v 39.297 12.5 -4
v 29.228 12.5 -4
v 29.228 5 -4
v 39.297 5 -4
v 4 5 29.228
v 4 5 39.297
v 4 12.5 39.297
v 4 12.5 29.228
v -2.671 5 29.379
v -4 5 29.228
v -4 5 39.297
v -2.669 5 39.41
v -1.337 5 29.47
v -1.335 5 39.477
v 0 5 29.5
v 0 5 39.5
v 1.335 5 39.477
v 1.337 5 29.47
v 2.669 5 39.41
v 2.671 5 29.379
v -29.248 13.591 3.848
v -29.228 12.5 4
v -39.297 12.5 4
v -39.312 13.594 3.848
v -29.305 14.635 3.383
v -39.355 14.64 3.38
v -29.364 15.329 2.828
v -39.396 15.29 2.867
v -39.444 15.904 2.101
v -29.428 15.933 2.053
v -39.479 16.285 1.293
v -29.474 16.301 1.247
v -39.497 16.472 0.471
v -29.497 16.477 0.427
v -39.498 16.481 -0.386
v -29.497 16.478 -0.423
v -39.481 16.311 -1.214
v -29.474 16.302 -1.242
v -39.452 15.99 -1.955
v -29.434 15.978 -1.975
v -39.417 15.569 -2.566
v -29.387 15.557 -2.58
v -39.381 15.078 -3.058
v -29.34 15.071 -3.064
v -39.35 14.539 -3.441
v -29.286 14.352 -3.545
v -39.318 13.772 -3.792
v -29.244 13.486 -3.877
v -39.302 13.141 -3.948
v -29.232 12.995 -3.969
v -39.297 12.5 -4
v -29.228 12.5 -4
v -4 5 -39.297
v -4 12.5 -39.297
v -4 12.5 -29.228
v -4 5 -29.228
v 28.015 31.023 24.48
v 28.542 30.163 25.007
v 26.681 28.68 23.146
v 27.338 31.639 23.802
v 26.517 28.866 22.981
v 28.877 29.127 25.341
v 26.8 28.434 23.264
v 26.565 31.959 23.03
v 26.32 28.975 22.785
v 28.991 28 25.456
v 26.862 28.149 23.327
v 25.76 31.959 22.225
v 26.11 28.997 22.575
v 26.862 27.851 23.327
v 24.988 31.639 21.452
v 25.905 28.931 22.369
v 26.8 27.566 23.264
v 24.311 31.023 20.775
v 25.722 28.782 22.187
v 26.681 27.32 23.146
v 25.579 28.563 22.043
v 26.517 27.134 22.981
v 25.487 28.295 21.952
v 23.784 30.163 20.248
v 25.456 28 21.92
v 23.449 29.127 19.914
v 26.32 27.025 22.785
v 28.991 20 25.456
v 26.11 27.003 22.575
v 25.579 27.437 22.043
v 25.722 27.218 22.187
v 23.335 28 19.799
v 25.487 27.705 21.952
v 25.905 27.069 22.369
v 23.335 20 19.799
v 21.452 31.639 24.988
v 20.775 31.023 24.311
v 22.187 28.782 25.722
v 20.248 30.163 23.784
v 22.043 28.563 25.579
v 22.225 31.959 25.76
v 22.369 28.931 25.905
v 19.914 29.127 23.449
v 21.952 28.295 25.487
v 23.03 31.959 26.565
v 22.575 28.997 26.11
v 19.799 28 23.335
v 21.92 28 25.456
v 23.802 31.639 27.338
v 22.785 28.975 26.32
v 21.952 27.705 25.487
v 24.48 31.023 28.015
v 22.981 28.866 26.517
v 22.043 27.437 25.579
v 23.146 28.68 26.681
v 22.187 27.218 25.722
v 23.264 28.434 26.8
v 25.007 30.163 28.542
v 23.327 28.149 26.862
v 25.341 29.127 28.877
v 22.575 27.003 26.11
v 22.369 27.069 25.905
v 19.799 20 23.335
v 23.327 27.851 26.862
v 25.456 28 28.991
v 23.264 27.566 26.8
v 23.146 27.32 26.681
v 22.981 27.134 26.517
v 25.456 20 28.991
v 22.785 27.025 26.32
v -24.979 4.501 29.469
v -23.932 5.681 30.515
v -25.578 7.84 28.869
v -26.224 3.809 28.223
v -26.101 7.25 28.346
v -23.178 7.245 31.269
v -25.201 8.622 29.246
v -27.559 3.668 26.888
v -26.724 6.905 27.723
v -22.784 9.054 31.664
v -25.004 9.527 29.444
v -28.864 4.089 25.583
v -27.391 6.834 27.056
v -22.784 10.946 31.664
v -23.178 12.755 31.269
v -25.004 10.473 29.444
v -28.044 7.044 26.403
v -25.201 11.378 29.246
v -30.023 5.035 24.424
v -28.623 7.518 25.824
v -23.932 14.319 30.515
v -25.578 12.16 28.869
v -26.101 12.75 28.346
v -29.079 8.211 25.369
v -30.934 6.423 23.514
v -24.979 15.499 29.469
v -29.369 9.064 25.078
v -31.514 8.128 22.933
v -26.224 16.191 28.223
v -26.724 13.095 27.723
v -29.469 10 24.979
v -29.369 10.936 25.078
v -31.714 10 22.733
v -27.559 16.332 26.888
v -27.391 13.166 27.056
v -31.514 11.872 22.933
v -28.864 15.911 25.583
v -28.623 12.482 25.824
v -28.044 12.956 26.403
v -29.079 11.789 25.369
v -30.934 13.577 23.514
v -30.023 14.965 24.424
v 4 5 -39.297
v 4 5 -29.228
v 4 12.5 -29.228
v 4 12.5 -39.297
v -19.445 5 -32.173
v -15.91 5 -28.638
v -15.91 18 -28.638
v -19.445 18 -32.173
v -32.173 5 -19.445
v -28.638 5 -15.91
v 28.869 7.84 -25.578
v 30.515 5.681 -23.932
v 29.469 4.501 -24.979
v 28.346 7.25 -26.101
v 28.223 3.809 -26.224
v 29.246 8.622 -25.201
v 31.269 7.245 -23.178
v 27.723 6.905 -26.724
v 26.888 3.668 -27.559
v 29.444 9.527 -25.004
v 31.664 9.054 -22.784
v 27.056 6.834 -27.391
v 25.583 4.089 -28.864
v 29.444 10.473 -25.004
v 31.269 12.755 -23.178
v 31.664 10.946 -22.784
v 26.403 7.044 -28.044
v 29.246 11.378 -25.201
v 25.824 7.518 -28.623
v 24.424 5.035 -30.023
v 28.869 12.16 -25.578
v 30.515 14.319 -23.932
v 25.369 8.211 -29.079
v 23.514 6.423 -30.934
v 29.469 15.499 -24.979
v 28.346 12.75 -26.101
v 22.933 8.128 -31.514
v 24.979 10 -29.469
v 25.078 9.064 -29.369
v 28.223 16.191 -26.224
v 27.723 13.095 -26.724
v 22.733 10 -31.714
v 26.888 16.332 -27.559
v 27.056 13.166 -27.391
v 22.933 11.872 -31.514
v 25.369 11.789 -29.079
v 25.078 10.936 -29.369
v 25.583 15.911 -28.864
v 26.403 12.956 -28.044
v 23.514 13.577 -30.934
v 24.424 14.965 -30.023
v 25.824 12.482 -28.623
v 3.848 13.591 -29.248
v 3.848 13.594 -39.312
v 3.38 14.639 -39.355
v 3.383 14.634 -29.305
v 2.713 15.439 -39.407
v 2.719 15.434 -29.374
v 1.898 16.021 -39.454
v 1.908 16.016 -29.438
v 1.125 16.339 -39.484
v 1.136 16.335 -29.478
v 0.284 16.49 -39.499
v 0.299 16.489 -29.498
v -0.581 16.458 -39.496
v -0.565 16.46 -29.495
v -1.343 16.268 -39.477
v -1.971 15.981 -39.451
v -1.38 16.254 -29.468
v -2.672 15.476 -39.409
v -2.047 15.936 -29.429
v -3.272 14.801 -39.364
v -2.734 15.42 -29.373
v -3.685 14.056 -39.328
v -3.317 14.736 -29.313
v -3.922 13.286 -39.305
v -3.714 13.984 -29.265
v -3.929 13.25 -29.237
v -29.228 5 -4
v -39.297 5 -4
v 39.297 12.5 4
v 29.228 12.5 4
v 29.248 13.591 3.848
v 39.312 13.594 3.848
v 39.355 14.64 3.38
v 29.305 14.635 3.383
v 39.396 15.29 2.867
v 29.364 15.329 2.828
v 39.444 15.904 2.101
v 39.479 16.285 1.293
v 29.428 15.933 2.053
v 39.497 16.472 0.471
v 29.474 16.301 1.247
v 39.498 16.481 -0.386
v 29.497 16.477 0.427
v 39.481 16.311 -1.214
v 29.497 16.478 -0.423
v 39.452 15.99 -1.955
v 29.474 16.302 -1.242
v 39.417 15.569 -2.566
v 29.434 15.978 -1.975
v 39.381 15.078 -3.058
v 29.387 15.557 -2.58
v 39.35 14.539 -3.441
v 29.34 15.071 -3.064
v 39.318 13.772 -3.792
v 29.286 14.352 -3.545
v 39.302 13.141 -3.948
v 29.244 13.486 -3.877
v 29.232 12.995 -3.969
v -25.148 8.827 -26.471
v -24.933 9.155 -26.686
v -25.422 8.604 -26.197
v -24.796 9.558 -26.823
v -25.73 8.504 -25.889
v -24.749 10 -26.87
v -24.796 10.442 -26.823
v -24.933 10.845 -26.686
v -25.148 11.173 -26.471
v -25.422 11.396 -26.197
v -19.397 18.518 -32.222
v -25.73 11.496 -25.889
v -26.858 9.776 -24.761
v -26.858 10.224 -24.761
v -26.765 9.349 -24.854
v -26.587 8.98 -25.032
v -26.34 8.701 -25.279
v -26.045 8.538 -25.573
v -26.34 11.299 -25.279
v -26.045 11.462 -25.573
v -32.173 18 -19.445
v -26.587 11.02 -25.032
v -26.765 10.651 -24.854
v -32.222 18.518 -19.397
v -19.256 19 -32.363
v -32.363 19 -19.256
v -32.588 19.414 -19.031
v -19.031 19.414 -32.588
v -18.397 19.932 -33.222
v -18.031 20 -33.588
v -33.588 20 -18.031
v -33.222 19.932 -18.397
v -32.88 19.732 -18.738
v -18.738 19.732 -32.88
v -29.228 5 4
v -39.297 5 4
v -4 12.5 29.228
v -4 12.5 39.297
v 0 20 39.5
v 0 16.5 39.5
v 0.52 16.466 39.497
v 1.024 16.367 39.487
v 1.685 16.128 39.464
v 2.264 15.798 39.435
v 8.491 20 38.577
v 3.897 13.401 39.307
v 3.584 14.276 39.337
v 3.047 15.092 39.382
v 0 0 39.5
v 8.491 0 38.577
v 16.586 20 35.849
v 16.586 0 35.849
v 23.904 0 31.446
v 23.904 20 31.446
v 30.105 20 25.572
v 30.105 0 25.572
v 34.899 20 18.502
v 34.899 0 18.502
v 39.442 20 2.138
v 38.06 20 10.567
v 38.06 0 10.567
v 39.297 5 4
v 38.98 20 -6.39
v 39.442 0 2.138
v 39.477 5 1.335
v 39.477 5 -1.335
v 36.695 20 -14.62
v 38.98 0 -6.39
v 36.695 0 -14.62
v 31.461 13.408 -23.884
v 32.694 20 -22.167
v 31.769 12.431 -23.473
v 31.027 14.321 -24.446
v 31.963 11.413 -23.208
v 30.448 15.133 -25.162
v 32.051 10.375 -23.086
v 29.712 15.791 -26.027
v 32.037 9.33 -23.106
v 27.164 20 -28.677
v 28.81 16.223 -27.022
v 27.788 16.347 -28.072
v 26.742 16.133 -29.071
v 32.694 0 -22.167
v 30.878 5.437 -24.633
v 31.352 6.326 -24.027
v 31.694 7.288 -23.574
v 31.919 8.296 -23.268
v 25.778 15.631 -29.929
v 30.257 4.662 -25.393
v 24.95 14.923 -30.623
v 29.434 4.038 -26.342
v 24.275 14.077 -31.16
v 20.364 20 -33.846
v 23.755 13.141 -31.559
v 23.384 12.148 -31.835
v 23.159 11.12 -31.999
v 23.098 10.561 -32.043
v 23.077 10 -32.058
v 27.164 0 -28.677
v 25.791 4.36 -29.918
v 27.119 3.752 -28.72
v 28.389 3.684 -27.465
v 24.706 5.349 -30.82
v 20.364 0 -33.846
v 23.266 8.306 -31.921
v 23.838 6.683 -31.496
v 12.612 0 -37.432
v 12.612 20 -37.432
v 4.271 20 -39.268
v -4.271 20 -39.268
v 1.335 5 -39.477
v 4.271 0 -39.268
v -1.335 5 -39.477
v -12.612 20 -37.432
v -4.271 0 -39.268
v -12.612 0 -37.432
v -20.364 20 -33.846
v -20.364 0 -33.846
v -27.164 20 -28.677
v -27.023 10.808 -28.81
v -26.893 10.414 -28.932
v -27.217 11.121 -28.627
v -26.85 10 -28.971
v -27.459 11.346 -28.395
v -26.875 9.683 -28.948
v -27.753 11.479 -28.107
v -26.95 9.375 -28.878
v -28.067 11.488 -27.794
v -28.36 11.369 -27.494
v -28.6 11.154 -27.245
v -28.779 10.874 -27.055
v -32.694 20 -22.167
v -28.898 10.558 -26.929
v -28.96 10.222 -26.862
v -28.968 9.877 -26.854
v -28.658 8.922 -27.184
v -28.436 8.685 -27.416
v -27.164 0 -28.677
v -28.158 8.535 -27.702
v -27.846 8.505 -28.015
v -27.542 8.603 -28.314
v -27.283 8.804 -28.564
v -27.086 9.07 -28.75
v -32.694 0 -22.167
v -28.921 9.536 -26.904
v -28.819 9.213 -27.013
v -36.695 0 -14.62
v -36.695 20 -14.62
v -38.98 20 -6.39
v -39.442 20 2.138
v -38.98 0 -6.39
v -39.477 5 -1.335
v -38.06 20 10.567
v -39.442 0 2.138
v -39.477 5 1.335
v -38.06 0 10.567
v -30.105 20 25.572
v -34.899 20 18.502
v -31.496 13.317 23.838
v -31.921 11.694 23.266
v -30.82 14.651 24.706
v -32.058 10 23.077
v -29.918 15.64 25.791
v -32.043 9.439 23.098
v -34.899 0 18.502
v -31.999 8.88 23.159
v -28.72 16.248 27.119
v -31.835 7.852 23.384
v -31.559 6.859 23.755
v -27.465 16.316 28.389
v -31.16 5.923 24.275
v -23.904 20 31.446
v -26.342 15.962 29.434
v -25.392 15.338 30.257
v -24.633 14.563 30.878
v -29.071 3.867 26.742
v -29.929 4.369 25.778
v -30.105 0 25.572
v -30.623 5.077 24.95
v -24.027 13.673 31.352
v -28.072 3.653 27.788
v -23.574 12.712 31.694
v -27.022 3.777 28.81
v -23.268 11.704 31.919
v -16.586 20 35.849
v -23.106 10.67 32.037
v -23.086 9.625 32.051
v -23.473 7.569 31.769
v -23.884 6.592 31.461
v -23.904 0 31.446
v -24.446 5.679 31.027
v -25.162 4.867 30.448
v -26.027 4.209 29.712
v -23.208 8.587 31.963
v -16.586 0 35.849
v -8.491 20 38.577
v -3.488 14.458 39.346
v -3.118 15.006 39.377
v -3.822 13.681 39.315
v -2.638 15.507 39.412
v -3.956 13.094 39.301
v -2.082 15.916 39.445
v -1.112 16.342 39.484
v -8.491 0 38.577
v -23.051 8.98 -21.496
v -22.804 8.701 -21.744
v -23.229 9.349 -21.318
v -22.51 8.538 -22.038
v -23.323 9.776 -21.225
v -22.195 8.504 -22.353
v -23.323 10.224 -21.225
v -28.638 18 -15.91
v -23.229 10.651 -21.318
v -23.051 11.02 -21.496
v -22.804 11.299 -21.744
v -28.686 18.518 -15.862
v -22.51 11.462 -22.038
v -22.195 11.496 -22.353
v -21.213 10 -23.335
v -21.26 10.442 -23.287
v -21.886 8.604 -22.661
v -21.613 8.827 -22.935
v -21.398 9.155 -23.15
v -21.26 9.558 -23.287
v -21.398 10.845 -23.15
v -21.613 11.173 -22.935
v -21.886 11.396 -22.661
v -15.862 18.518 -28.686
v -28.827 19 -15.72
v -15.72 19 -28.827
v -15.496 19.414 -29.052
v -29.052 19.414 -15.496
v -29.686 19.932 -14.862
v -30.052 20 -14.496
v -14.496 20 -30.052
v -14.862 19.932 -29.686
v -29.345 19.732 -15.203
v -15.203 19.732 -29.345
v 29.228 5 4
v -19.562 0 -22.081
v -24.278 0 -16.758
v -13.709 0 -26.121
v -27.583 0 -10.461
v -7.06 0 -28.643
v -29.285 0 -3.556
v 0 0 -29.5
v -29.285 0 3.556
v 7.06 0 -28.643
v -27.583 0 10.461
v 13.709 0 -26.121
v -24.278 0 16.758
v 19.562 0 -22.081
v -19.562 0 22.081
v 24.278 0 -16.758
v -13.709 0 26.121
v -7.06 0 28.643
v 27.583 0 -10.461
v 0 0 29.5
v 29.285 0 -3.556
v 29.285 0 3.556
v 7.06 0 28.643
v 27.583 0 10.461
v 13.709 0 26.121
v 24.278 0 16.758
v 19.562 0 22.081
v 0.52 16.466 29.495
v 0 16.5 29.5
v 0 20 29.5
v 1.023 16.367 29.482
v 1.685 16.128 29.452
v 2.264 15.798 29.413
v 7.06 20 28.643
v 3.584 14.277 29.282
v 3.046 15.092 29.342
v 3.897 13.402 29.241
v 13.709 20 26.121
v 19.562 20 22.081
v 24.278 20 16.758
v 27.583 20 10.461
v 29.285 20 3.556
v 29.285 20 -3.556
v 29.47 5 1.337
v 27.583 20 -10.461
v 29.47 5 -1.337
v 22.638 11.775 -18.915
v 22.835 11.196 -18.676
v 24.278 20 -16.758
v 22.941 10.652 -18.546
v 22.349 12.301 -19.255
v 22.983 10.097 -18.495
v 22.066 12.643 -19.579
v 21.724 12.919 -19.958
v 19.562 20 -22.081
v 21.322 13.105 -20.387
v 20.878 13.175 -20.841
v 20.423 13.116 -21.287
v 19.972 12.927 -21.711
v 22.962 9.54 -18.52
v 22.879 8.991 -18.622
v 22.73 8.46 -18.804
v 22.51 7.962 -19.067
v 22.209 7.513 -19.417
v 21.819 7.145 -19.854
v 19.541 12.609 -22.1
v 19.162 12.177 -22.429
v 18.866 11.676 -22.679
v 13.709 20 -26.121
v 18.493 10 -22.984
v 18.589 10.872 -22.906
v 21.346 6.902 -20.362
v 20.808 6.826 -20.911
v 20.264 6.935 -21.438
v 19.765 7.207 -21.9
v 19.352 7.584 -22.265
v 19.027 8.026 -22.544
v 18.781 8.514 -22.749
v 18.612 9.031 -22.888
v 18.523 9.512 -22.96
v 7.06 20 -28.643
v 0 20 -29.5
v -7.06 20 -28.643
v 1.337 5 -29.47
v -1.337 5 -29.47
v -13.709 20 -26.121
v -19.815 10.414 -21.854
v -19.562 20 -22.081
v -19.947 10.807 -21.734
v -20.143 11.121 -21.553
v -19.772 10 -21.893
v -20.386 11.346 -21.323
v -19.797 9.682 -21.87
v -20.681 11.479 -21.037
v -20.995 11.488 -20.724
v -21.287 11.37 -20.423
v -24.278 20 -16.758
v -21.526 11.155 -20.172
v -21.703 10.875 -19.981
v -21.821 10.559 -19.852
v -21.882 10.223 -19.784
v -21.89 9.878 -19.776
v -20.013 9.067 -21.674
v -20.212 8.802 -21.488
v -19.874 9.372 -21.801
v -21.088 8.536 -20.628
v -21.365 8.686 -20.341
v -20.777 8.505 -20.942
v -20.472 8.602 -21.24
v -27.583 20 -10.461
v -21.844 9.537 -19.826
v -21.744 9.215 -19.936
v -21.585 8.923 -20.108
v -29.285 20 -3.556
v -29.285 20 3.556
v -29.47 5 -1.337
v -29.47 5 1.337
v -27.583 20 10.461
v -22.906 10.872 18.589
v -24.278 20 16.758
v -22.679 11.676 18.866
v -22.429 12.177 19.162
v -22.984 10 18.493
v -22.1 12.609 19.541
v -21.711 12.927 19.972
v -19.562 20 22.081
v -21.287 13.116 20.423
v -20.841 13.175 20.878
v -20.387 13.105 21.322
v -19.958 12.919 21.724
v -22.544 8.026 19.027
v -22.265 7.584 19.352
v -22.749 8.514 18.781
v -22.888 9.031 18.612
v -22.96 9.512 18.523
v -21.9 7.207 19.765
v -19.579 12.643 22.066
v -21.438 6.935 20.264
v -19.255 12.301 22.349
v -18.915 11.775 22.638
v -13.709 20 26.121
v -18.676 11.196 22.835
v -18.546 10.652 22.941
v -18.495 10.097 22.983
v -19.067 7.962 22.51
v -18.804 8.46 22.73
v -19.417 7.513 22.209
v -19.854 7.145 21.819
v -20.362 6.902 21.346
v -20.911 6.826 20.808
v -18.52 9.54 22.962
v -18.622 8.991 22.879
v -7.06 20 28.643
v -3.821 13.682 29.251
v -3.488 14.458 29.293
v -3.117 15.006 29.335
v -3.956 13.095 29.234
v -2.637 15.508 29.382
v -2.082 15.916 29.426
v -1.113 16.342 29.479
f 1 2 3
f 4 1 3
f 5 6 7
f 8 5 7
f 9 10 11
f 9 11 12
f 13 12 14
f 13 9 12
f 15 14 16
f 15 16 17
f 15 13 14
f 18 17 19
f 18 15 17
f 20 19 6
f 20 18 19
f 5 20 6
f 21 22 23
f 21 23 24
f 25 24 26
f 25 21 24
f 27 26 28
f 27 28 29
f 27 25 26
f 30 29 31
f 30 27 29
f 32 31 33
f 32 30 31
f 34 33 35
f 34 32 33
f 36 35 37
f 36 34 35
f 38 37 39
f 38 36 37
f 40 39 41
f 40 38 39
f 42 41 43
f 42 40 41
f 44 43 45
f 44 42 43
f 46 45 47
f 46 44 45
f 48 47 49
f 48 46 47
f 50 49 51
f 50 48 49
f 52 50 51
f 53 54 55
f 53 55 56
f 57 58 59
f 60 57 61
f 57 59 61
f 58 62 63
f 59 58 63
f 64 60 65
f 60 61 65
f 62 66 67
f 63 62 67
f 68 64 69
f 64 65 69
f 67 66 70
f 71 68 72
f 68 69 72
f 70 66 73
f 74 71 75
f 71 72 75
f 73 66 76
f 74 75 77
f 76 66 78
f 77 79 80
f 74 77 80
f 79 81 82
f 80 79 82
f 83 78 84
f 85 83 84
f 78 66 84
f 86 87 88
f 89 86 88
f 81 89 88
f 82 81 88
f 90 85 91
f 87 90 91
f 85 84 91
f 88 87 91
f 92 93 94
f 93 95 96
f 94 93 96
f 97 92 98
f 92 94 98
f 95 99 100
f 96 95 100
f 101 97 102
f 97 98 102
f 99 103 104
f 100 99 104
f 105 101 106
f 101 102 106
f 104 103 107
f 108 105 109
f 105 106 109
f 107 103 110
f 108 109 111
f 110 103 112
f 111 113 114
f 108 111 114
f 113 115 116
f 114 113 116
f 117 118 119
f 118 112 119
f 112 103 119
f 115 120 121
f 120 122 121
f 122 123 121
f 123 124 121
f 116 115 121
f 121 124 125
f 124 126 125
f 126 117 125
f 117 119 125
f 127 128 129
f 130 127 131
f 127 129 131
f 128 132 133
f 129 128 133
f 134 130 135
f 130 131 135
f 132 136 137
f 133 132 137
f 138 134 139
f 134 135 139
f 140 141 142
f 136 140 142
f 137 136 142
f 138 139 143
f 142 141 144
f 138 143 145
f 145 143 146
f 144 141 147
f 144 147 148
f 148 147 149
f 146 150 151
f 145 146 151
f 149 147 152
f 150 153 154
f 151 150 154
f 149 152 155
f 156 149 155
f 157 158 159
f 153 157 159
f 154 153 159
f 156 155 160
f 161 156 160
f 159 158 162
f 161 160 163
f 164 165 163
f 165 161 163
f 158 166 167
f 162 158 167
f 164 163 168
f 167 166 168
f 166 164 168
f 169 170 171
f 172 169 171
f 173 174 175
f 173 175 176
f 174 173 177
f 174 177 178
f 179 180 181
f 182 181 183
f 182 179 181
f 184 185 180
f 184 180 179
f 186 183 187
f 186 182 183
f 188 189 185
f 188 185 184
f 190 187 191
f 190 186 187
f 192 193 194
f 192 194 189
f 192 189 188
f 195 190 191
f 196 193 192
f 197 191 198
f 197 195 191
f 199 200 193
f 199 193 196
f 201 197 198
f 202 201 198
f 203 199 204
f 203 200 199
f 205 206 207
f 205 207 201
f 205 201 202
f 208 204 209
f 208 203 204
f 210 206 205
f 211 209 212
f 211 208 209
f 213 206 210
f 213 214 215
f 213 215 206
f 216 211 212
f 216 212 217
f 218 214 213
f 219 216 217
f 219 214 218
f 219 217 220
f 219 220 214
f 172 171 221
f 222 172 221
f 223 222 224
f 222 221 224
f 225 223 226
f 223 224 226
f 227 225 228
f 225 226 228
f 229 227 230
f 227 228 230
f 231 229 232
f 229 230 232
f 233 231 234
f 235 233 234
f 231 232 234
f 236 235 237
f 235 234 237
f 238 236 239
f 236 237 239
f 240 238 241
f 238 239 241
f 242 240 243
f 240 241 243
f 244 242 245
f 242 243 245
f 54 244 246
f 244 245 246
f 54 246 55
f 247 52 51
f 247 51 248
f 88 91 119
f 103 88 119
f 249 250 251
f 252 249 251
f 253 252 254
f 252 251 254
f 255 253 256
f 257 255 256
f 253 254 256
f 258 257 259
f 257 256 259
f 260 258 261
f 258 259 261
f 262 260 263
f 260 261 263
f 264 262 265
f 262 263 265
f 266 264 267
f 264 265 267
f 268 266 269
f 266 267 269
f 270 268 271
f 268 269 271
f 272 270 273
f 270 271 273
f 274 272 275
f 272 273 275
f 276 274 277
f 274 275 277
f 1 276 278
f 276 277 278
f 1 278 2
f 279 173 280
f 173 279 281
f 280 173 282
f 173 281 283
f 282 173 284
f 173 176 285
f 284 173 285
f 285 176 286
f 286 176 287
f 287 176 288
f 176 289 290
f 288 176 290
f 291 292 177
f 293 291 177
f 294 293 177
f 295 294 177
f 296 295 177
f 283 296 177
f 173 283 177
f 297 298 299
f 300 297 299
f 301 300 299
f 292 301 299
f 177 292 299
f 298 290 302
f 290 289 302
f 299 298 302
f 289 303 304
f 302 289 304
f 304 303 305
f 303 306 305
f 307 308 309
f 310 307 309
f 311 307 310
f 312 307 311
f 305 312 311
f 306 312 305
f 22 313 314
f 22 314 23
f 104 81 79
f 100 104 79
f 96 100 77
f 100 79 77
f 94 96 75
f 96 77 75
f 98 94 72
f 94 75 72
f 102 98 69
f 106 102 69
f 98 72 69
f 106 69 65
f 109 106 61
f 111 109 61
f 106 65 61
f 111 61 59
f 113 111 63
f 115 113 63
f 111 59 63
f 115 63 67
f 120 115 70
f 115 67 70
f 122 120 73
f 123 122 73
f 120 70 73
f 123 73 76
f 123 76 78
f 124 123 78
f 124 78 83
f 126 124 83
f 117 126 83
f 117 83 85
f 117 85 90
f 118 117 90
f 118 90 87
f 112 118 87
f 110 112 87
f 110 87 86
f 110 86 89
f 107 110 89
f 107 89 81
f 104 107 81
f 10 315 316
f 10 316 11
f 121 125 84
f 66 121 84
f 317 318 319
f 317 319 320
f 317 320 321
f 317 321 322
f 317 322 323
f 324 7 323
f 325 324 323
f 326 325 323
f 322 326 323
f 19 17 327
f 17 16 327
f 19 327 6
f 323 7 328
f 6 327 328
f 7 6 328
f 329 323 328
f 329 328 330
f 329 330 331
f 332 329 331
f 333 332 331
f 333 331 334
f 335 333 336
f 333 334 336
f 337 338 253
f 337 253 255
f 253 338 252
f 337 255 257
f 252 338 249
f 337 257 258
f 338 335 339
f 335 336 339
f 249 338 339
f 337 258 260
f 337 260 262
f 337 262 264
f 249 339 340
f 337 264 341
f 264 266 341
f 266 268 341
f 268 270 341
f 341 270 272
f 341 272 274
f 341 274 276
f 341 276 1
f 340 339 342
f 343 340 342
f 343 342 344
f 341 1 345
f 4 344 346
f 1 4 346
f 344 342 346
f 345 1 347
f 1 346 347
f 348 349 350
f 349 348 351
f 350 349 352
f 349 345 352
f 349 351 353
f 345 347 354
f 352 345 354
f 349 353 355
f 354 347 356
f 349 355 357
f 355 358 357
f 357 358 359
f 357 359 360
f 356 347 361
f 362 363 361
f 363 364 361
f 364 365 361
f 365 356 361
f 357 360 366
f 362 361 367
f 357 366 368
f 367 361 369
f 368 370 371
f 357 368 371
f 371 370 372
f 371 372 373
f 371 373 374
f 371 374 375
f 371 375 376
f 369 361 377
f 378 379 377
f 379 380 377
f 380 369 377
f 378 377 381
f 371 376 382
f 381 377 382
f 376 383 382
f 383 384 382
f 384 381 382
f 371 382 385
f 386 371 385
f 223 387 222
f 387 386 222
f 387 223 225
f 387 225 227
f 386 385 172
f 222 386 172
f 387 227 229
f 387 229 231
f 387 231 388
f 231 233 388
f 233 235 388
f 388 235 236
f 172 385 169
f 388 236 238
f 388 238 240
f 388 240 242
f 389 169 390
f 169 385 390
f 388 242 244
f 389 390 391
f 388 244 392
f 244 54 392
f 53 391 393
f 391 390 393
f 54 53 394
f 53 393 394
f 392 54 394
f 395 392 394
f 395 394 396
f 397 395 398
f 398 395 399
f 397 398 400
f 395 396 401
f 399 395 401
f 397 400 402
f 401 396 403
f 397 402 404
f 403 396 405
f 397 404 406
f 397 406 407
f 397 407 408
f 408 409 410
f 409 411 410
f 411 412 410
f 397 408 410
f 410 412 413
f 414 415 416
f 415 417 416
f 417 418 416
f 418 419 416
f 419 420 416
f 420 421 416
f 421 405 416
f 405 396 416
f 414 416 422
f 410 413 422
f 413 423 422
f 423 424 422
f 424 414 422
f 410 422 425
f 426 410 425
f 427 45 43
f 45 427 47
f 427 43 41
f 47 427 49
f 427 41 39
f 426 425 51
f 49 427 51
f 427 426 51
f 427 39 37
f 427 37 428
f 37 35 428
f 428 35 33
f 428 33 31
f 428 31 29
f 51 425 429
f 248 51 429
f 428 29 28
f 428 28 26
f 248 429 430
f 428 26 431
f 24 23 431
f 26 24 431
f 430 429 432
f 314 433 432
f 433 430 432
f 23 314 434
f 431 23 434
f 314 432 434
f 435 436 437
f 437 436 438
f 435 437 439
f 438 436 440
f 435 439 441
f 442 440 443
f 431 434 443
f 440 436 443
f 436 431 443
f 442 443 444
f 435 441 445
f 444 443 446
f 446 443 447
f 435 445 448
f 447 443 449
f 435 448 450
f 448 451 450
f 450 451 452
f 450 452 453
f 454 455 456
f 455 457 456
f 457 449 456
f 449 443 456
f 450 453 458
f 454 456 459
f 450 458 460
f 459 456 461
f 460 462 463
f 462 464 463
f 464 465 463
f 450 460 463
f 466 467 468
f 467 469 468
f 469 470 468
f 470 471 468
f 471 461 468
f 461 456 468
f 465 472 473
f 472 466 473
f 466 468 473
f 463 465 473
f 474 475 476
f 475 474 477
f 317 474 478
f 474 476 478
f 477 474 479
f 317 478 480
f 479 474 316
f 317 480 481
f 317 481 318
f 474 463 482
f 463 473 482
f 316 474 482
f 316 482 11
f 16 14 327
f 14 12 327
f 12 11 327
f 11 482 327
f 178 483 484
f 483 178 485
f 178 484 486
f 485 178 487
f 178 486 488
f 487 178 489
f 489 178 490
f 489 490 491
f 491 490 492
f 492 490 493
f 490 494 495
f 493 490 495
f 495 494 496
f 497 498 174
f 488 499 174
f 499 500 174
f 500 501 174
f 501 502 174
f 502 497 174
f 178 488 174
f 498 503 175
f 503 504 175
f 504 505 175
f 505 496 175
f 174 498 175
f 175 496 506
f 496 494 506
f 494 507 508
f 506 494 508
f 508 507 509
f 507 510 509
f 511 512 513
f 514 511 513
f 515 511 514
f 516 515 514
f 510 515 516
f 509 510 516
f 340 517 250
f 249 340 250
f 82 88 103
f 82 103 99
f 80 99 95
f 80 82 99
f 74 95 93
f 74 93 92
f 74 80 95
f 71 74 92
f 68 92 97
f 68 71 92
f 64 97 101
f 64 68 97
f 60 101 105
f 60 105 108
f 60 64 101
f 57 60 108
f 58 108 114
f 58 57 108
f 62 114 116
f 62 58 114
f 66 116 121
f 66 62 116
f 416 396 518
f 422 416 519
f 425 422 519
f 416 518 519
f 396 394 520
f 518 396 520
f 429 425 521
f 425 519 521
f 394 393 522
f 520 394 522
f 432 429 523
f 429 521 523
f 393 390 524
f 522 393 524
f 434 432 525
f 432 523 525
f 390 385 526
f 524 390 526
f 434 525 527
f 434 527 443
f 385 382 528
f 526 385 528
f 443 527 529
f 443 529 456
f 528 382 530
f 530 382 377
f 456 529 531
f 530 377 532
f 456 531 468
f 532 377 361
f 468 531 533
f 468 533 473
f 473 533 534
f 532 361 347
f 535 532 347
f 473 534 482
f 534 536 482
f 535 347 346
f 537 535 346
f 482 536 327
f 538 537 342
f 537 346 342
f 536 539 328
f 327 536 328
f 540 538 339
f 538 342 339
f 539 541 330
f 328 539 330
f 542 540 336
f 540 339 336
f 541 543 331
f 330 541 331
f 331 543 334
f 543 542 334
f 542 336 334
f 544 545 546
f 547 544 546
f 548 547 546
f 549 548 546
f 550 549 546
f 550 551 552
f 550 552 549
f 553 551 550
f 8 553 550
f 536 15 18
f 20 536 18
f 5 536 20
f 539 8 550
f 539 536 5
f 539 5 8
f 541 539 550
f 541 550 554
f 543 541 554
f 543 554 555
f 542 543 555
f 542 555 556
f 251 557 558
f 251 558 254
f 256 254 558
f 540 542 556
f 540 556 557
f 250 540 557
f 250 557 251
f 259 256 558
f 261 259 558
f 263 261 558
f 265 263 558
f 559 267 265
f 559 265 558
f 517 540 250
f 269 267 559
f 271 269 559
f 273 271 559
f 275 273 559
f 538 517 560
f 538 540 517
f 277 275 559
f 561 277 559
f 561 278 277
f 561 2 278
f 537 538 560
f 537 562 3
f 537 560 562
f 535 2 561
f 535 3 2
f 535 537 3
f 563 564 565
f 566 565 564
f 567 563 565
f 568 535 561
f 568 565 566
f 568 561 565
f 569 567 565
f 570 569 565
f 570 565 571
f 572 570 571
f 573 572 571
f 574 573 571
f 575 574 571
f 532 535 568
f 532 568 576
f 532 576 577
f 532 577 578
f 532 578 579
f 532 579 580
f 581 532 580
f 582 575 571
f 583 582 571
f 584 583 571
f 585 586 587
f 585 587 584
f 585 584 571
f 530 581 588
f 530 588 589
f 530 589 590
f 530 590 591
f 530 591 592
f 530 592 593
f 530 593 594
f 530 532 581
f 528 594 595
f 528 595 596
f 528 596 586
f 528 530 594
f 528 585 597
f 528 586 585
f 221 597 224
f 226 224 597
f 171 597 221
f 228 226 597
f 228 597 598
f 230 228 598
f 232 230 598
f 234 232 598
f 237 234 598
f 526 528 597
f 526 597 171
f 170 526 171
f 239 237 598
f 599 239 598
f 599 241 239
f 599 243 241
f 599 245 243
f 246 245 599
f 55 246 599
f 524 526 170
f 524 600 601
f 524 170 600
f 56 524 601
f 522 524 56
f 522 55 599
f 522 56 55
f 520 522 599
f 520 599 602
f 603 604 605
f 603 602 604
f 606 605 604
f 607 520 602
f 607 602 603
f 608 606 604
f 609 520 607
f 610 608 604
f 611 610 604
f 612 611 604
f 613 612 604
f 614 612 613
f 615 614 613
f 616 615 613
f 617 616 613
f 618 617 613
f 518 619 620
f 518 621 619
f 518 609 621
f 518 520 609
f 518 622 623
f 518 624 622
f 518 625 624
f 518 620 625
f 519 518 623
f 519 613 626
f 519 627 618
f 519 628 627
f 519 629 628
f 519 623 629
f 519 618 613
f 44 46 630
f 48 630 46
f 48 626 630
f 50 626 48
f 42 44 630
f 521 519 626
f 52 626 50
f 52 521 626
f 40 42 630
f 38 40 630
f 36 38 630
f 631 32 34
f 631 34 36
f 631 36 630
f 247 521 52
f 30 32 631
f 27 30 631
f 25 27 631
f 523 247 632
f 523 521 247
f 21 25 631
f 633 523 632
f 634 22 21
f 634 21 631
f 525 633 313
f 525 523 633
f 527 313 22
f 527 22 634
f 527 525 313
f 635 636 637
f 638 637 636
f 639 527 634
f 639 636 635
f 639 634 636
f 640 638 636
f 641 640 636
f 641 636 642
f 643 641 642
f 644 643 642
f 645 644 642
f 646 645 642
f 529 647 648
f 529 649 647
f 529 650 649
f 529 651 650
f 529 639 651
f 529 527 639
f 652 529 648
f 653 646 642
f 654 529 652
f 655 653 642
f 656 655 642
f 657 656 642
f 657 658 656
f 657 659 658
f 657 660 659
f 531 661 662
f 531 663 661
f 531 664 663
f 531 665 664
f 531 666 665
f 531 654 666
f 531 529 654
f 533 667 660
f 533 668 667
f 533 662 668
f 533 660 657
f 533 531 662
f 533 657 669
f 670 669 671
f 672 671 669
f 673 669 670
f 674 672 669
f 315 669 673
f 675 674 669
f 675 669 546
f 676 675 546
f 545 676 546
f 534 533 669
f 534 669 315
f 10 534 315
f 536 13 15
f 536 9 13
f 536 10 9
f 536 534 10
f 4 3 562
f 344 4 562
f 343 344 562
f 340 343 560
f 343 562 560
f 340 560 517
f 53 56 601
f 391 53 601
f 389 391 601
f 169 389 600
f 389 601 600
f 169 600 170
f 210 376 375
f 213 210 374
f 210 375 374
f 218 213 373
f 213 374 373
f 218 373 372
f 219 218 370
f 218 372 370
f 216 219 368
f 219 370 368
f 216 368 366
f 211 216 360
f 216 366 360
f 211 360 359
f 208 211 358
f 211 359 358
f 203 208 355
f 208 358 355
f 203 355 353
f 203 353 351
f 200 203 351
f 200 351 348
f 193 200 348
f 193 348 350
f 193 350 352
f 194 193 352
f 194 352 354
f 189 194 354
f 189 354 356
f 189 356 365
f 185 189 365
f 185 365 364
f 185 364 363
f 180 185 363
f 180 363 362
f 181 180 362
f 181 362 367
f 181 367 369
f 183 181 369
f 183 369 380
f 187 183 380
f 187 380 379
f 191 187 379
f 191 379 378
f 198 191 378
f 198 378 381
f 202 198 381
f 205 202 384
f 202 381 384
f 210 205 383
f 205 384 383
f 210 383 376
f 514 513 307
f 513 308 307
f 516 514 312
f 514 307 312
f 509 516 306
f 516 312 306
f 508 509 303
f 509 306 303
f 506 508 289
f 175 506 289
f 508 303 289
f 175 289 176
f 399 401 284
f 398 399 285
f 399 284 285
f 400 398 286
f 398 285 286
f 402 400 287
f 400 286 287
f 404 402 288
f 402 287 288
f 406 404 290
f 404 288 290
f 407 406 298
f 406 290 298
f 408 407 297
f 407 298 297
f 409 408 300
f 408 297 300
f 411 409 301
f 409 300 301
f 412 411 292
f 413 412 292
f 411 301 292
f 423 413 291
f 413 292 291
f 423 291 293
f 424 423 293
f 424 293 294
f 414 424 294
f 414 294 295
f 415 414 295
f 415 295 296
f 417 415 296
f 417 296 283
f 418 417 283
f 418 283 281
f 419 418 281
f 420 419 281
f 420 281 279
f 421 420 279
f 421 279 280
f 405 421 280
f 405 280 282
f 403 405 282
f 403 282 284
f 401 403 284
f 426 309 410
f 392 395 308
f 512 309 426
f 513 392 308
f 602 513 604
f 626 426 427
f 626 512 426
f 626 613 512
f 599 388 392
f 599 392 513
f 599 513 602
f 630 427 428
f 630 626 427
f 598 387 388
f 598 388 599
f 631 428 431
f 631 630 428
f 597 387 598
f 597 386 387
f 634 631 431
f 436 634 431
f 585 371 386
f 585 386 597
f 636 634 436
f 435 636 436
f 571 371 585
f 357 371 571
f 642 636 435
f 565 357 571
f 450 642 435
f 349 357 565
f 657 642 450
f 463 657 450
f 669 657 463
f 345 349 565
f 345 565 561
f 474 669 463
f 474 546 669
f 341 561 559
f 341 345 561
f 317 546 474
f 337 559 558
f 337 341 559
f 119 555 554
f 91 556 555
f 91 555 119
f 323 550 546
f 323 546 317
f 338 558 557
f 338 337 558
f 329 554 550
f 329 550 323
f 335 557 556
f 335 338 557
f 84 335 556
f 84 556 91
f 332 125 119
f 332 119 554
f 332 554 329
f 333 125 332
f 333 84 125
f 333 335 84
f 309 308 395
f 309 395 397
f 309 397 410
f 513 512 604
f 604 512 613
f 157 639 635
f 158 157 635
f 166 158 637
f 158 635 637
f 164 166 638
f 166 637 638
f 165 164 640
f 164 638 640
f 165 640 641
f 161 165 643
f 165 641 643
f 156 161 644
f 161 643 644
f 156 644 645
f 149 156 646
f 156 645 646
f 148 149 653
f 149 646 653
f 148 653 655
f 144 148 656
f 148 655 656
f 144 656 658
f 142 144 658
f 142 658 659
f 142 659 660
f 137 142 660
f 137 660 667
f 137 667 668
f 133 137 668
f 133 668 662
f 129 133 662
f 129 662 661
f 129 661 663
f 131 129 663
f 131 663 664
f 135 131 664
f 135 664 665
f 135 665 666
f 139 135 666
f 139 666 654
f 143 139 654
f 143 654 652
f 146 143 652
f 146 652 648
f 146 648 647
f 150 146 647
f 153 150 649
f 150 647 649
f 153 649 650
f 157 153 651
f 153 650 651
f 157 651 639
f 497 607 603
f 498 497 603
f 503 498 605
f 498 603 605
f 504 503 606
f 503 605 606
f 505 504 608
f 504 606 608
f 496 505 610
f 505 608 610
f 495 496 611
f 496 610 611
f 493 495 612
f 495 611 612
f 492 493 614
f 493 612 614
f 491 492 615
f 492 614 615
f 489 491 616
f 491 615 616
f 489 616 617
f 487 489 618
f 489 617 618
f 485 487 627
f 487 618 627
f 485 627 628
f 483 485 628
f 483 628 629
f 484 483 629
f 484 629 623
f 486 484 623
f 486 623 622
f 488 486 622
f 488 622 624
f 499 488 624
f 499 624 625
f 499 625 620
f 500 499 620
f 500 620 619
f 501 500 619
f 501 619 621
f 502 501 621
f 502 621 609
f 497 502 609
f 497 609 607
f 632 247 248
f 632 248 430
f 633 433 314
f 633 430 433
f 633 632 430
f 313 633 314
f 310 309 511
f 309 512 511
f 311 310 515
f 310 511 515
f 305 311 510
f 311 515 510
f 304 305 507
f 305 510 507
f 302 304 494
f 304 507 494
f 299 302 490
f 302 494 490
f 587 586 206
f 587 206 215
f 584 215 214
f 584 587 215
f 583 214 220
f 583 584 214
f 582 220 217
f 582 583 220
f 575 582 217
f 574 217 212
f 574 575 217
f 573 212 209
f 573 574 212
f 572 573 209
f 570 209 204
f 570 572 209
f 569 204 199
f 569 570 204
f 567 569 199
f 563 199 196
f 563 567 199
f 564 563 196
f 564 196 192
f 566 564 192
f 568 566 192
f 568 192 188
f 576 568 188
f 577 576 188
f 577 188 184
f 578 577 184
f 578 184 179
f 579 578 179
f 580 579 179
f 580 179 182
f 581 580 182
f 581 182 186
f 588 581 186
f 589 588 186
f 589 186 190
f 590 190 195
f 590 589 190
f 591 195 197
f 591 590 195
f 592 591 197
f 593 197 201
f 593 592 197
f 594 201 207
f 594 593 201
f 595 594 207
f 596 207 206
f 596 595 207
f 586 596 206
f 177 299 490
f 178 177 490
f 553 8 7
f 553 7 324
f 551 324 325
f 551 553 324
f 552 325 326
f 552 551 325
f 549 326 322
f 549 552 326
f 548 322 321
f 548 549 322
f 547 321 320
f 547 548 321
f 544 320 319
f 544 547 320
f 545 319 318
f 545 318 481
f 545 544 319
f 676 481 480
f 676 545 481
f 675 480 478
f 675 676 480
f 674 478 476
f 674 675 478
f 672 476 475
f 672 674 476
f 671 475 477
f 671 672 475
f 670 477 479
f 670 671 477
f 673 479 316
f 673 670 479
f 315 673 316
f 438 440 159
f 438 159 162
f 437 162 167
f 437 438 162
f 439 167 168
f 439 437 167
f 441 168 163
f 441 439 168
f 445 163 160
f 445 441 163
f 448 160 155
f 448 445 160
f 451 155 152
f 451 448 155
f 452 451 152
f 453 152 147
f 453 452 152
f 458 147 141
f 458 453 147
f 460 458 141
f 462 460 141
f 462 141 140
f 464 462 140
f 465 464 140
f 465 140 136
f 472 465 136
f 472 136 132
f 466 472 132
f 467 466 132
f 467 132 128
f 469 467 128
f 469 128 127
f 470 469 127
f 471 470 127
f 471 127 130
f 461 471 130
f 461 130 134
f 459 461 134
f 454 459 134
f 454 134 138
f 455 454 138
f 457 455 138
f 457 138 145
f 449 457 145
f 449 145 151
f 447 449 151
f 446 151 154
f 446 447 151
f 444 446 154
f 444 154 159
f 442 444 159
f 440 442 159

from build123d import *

# Parameters (mm, degrees)
SKETCH1_R               = 39.5
SKETCH1_R_2             = 29.5
BOSS_EXTRUDE1_DEPTH     = 20
CUT_EXTRUDE1_DEPTH      = 60.333801496
CUT_EXTRUDE2_DEPTH      = 60.333801663
CUT_EXTRUDE3_REACH      = 61.334
CUT_EXTRUDE3_END_RADIUS = 39.5
SKETCH4_R               = 3.175
CUT_EXTRUDE4_REACH      = 61.334
CUT_EXTRUDE4_END_RADIUS = 39.5
SKETCH4_2_R             = 3.175
BOSS_EXTRUDE2_DEPTH     = 13
CUT_EXTRUDE7_REACH      = 69.045
CUT_EXTRUDE8_REACH      = 68.559
SKETCH7_R               = 1
SKETCH8_R               = 6.35
CUT_EXTRUDE9_DEPTH      = 1
CUT_EXTRUDE11_DEPTH     = 15
SKETCH10_R              = 1.5
CUT_EXTRUDE12_DEPTH     = 40
FILLET1_R               = 2
FILLET2_R               = 2


with BuildPart() as part:
    # Sketch1 → Boss-Extrude1 (new body)
    with BuildSketch(Plane(origin=(0, 0, 0), x_dir=(1, 0, 0), z_dir=(0, 1, 0))):
        with Locations(Location((0, 0, 0), (0, 0, 270))):
            Circle(SKETCH1_R)
        with Locations(Location((0, 0, 0), (0, 0, 270))):
            Circle(SKETCH1_R_2, mode=Mode.SUBTRACT)
    extrude(amount=BOSS_EXTRUDE1_DEPTH)

    # Sketch2 → Cut-Extrude1 (cut, through all)
    with BuildSketch(Plane(origin=(0, 0, 0), x_dir=(0, 0, -1), z_dir=(1, 0, 0))):
        with BuildLine():
            Line((4, 5), (-4, 5))
            Line((-4, 5), (-4, 12.5))
            ThreePointArc((-4, 12.5), (0, 16.5), (4, 12.5))
            Line((4, 12.5), (4, 5))
        make_face()
    cut_extrude1 = extrude(amount=-CUT_EXTRUDE1_DEPTH, mode=Mode.SUBTRACT)

    # Sketch2<2> → Cut-Extrude2 (cut, through all)
    with BuildSketch(Plane(origin=(0, 0, 0), x_dir=(0, 0, -1), z_dir=(1, 0, 0))):
        with BuildLine():
            Line((4, 5), (-4, 5))
            Line((-4, 5), (-4, 12.5))
            ThreePointArc((-4, 12.5), (0, 16.5), (4, 12.5))
            Line((4, 12.5), (4, 5))
        make_face()
    cut_extrude2 = extrude(amount=CUT_EXTRUDE2_DEPTH, mode=Mode.SUBTRACT)

    # Mirror1: Cut-Extrude1, Cut-Extrude2 across plane
    add(cut_extrude1.mirror(Plane(origin=(0, 0, 0), x_dir=(0.7071067811865478, 0, 0.7071067811865472), z_dir=(0.7071067811865475, 0, -0.7071067811865477))), mode=Mode.SUBTRACT)
    add(cut_extrude2.mirror(Plane(origin=(0, 0, 0), x_dir=(0.7071067811865478, 0, 0.7071067811865472), z_dir=(0.7071067811865475, 0, -0.7071067811865477))), mode=Mode.SUBTRACT)

    # Cut-Extrude3: up to this cylinder (the profile starts inside it)
    cut_extrude3_end = Plane(origin=(0, 10, 0), z_dir=(0, -1, 0)) * Cylinder(CUT_EXTRUDE3_END_RADIUS, 202.668, mode=Mode.PRIVATE)
    # Sketch4 → Cut-Extrude3 (cut, up to the surface)
    with BuildSketch(Plane(origin=(0, 0, 0), x_dir=(-0.7071067811865477, 0, -0.7071067811865475), z_dir=(0.7071067811865475, 0, -0.7071067811865477)), mode=Mode.PRIVATE) as cut_extrude3_sk1:
        with Locations((0, 10)):
            Circle(SKETCH4_R)
    cut_extrude3_tool1 = extrude(cut_extrude3_sk1.sketch, amount=-CUT_EXTRUDE3_REACH, mode=Mode.PRIVATE) & cut_extrude3_end
    add(cut_extrude3_tool1.solids().sort_by_distance((0, 10, 0))[0], mode=Mode.SUBTRACT)

    # Cut-Extrude4: up to this cylinder (the profile starts inside it)
    cut_extrude4_end = Plane(origin=(0, 10, 0), z_dir=(0, -1, 0)) * Cylinder(CUT_EXTRUDE4_END_RADIUS, 202.668, mode=Mode.PRIVATE)
    # Sketch4<2> → Cut-Extrude4 (cut, up to the surface)
    with BuildSketch(Plane(origin=(0, 0, 0), x_dir=(-0.7071067811865477, 0, -0.7071067811865475), z_dir=(0.7071067811865475, 0, -0.7071067811865477)), mode=Mode.PRIVATE) as cut_extrude4_sk1:
        with Locations((0, 10)):
            Circle(SKETCH4_2_R)
    cut_extrude4_tool1 = extrude(cut_extrude4_sk1.sketch, amount=CUT_EXTRUDE4_REACH, mode=Mode.PRIVATE) & cut_extrude4_end
    add(cut_extrude4_tool1.solids().sort_by_distance((0, 10, 0))[0], mode=Mode.SUBTRACT)

    # Sketch5 → Boss-Extrude2 (add)
    with BuildSketch(Plane(origin=(0, 20, 0), x_dir=(1, 0, 0), z_dir=(0, 1, 0))):
        Polygon((25.455844123, -28.991378029), (28.991378029, -25.455844123), (23.334523779, -19.798989873), (19.798989873, -23.334523779), align=None)
    extrude(amount=BOSS_EXTRUDE2_DEPTH)

    # Sketch6 → Cut-Extrude7 (cut, up to next)
    with BuildSketch(Plane(origin=(1.767766953, 0, -1.767766953), x_dir=(-0.7071067811865475, 0, -0.7071067811865477), z_dir=(0.7071067811865477, 0, -0.7071067811865475)), mode=Mode.PRIVATE) as cut_extrude7_sk1:
        with BuildLine():
            Line((-38.5, 28), (-38.5, 33))
            Line((-38.5, 33), (-30.5, 33))
            Line((-30.5, 33), (-30.5, 28))
            ThreePointArc((-30.5, 28), (-34.5, 32), (-38.5, 28))
        make_face()
    cut_extrude7_tool1 = extrude(cut_extrude7_sk1.sketch, amount=-CUT_EXTRUDE7_REACH, mode=Mode.PRIVATE) & part.part
    add(cut_extrude7_tool1.solids().sort_by_distance((26.162951, 32.09434, 22.627417))[0], mode=Mode.SUBTRACT)

    # Sketch7 → Cut-Extrude8 (cut, up to next)
    with BuildSketch(Plane(origin=(1.767766953, 0, -1.767766953), x_dir=(-0.7071067811865475, 0, -0.7071067811865477), z_dir=(0.7071067811865477, 0, -0.7071067811865475)), mode=Mode.PRIVATE) as cut_extrude8_sk1:
        with Locations((-34.5, 28)):
            Circle(SKETCH7_R)
    cut_extrude8_tool1 = extrude(cut_extrude8_sk1.sketch, amount=-CUT_EXTRUDE8_REACH, mode=Mode.PRIVATE) & part.part
    add(cut_extrude8_tool1.solids().sort_by_distance((26.162951, 28, 22.627417))[0], mode=Mode.SUBTRACT)

    # Sketch8 → Cut-Extrude9 (cut)
    with BuildSketch(Plane(origin=(27.930717857, 0, -27.930717857), x_dir=(-0.7071067811865477, 0, -0.7071067811865475), z_dir=(0.7071067811865475, 0, -0.7071067811865477))):
        with Locations((0, 10)):
            Circle(SKETCH8_R)
    cut_extrude9 = extrude(amount=-CUT_EXTRUDE9_DEPTH, mode=Mode.SUBTRACT)

    # Mirror3: Cut-Extrude9 across plane
    add(cut_extrude9.mirror(Plane(origin=(0, 0, 0), x_dir=(0.7071067811865478, 0, 0.7071067811865472), z_dir=(0.7071067811865475, 0, -0.7071067811865477))), mode=Mode.SUBTRACT)

    # Sketch9 → Cut-Extrude11 (cut)
    with BuildSketch(Plane(origin=(0, 20, 0), x_dir=(1, 0, 0), z_dir=(0, 1, 0))):
        Polygon((-19.445436483, 32.173358544), (-32.173358544, 19.445436483), (-28.637824638, 15.909902577), (-15.909902577, 28.637824638), align=None)
    extrude(amount=-CUT_EXTRUDE11_DEPTH, mode=Mode.SUBTRACT)

    # Sketch10 → Cut-Extrude12 (cut)
    with BuildSketch(Plane(origin=(0, 0, 0), x_dir=(0.7071067811865477, 0, -0.7071067811865475), z_dir=(0.7071067811865475, 0, 0.7071067811865477))):
        with Locations((0, 10)):
            Circle(SKETCH10_R)
    extrude(amount=-CUT_EXTRUDE12_DEPTH, mode=Mode.SUBTRACT)

    # Fillet1
    fillet1_edges = [part.edges().sort_by_distance(p)[0] for p in [
        (-17.67766953, 20, -30.405591591),
    ]]
    fillet(fillet1_edges, radius=FILLET1_R)

    # Fillet2
    fillet2_edges = [part.edges().sort_by_distance(p)[0] for p in [
        (-30.405591591, 20, -17.67766953),
    ]]
    fillet(fillet2_edges, radius=FILLET2_R)


solid = part.part
